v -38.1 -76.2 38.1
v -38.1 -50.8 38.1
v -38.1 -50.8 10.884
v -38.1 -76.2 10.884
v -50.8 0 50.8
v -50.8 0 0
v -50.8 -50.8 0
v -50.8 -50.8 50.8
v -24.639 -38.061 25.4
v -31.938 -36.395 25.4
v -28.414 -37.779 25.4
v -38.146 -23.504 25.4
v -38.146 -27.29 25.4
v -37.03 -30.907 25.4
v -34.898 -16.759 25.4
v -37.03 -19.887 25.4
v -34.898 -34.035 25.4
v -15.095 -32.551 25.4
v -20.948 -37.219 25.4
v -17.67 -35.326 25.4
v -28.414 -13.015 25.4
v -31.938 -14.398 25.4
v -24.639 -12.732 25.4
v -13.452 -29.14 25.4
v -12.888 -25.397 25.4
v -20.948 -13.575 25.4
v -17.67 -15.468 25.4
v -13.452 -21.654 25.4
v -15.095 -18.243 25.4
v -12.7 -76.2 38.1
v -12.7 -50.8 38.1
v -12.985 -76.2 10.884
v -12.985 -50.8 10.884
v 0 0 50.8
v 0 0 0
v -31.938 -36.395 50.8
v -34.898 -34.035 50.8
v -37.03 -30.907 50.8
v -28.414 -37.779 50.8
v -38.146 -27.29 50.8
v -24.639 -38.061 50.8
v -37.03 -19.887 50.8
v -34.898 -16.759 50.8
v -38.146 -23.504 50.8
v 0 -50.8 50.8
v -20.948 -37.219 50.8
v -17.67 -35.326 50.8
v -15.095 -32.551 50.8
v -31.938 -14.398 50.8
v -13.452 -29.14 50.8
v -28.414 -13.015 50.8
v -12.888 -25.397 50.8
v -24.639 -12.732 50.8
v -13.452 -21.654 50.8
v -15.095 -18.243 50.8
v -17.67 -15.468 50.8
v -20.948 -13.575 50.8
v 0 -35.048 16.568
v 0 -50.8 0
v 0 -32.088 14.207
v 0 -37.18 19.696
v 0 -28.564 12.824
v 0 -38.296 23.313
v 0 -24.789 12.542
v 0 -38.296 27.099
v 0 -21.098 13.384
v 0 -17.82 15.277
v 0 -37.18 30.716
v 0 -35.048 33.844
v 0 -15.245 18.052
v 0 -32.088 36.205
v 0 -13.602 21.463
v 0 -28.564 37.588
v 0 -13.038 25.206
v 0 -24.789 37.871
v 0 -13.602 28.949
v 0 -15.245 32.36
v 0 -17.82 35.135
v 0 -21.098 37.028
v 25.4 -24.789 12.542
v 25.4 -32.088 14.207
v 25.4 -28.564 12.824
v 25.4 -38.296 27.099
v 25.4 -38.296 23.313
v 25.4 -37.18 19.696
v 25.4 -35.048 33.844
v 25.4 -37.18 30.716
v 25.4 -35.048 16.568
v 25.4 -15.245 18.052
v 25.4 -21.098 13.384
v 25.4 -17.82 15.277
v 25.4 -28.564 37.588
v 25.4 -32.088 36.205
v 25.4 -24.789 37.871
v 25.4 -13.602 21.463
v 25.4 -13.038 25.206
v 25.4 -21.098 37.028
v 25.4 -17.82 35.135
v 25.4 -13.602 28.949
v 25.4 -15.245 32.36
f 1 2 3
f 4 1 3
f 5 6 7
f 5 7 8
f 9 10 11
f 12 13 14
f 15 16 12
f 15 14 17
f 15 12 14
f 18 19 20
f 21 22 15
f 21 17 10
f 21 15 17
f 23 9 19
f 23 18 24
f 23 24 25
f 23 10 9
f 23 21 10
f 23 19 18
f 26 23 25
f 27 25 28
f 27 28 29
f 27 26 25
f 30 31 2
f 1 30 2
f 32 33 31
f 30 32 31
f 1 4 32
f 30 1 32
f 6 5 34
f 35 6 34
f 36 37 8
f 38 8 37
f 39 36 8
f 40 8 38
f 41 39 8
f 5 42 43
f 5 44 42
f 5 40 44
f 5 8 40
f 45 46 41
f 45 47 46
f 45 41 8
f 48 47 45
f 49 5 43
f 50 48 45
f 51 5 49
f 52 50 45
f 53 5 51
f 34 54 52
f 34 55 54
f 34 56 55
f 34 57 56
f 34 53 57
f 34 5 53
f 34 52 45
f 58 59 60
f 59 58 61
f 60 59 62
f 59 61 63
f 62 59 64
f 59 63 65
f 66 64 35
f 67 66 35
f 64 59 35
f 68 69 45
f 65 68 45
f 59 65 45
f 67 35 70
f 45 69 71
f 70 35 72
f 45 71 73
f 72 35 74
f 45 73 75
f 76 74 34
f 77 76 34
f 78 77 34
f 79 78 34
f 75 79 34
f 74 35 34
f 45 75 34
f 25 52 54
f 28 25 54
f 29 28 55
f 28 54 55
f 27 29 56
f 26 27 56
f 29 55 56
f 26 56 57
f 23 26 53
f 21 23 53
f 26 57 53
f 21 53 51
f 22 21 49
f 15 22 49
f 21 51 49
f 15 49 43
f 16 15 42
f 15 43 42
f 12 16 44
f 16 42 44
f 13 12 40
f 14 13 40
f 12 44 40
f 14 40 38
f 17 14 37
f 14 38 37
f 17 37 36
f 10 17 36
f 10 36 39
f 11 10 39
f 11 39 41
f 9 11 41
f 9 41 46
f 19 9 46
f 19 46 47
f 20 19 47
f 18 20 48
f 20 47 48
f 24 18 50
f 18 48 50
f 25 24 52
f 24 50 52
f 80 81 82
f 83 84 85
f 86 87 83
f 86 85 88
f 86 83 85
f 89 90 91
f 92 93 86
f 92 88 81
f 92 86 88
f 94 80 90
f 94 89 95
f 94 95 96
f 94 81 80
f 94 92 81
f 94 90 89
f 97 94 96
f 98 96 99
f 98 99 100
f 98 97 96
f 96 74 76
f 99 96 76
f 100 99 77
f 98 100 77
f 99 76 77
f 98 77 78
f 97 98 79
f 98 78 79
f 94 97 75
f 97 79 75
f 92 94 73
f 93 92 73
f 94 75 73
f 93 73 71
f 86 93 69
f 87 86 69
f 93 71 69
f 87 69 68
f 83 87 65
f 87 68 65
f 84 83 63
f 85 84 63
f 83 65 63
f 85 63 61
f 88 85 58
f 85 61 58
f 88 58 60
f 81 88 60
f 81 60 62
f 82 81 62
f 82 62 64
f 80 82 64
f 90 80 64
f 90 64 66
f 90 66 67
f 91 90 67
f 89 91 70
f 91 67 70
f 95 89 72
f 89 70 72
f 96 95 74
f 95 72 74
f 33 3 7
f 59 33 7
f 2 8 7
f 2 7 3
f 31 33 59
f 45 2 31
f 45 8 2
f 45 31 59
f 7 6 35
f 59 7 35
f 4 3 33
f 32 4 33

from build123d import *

# Parameters (mm, degrees)
F0_W     = 50.8
F0_H     = 50.8
F1_DEPTH = 50.8
F3_DEPTH = 25.4
F4_R     = 12.7
F5_DEPTH = 25.4
F6_R     = 12.7
F7_DEPTH = 25.4


with BuildPart() as f1:
    # F0 (on Front) → F1 (new body)
    with BuildSketch(Plane.XZ):
        with Locations((-25.4, 25.4)):
            Rectangle(F0_W, F0_H)
    extrude(amount=F1_DEPTH)

    # F2 (on face) → F3 (join)
    with BuildSketch(Plane.XZ.offset(50.8)):
        Polygon((-12.7, 38.1), (-38.1, 38.1), (-38.1, 10.884415), (-12.984917, 10.884415), align=None)
    extrude(amount=F3_DEPTH)

    # F4 (on face) → F5 (join)
    with BuildSketch(Plane.YZ):
        with Locations((-25.738167, 25.206015)):
            Circle(F4_R)
    extrude(amount=F5_DEPTH)

    # F6 (on face) → F7 (cut)
    with BuildSketch(Plane.XY.offset(50.8)):
        with Locations((-25.587924, -25.396967)):
            Circle(F6_R)
    extrude(amount=-F7_DEPTH, mode=Mode.SUBTRACT)


solid = f1.part
